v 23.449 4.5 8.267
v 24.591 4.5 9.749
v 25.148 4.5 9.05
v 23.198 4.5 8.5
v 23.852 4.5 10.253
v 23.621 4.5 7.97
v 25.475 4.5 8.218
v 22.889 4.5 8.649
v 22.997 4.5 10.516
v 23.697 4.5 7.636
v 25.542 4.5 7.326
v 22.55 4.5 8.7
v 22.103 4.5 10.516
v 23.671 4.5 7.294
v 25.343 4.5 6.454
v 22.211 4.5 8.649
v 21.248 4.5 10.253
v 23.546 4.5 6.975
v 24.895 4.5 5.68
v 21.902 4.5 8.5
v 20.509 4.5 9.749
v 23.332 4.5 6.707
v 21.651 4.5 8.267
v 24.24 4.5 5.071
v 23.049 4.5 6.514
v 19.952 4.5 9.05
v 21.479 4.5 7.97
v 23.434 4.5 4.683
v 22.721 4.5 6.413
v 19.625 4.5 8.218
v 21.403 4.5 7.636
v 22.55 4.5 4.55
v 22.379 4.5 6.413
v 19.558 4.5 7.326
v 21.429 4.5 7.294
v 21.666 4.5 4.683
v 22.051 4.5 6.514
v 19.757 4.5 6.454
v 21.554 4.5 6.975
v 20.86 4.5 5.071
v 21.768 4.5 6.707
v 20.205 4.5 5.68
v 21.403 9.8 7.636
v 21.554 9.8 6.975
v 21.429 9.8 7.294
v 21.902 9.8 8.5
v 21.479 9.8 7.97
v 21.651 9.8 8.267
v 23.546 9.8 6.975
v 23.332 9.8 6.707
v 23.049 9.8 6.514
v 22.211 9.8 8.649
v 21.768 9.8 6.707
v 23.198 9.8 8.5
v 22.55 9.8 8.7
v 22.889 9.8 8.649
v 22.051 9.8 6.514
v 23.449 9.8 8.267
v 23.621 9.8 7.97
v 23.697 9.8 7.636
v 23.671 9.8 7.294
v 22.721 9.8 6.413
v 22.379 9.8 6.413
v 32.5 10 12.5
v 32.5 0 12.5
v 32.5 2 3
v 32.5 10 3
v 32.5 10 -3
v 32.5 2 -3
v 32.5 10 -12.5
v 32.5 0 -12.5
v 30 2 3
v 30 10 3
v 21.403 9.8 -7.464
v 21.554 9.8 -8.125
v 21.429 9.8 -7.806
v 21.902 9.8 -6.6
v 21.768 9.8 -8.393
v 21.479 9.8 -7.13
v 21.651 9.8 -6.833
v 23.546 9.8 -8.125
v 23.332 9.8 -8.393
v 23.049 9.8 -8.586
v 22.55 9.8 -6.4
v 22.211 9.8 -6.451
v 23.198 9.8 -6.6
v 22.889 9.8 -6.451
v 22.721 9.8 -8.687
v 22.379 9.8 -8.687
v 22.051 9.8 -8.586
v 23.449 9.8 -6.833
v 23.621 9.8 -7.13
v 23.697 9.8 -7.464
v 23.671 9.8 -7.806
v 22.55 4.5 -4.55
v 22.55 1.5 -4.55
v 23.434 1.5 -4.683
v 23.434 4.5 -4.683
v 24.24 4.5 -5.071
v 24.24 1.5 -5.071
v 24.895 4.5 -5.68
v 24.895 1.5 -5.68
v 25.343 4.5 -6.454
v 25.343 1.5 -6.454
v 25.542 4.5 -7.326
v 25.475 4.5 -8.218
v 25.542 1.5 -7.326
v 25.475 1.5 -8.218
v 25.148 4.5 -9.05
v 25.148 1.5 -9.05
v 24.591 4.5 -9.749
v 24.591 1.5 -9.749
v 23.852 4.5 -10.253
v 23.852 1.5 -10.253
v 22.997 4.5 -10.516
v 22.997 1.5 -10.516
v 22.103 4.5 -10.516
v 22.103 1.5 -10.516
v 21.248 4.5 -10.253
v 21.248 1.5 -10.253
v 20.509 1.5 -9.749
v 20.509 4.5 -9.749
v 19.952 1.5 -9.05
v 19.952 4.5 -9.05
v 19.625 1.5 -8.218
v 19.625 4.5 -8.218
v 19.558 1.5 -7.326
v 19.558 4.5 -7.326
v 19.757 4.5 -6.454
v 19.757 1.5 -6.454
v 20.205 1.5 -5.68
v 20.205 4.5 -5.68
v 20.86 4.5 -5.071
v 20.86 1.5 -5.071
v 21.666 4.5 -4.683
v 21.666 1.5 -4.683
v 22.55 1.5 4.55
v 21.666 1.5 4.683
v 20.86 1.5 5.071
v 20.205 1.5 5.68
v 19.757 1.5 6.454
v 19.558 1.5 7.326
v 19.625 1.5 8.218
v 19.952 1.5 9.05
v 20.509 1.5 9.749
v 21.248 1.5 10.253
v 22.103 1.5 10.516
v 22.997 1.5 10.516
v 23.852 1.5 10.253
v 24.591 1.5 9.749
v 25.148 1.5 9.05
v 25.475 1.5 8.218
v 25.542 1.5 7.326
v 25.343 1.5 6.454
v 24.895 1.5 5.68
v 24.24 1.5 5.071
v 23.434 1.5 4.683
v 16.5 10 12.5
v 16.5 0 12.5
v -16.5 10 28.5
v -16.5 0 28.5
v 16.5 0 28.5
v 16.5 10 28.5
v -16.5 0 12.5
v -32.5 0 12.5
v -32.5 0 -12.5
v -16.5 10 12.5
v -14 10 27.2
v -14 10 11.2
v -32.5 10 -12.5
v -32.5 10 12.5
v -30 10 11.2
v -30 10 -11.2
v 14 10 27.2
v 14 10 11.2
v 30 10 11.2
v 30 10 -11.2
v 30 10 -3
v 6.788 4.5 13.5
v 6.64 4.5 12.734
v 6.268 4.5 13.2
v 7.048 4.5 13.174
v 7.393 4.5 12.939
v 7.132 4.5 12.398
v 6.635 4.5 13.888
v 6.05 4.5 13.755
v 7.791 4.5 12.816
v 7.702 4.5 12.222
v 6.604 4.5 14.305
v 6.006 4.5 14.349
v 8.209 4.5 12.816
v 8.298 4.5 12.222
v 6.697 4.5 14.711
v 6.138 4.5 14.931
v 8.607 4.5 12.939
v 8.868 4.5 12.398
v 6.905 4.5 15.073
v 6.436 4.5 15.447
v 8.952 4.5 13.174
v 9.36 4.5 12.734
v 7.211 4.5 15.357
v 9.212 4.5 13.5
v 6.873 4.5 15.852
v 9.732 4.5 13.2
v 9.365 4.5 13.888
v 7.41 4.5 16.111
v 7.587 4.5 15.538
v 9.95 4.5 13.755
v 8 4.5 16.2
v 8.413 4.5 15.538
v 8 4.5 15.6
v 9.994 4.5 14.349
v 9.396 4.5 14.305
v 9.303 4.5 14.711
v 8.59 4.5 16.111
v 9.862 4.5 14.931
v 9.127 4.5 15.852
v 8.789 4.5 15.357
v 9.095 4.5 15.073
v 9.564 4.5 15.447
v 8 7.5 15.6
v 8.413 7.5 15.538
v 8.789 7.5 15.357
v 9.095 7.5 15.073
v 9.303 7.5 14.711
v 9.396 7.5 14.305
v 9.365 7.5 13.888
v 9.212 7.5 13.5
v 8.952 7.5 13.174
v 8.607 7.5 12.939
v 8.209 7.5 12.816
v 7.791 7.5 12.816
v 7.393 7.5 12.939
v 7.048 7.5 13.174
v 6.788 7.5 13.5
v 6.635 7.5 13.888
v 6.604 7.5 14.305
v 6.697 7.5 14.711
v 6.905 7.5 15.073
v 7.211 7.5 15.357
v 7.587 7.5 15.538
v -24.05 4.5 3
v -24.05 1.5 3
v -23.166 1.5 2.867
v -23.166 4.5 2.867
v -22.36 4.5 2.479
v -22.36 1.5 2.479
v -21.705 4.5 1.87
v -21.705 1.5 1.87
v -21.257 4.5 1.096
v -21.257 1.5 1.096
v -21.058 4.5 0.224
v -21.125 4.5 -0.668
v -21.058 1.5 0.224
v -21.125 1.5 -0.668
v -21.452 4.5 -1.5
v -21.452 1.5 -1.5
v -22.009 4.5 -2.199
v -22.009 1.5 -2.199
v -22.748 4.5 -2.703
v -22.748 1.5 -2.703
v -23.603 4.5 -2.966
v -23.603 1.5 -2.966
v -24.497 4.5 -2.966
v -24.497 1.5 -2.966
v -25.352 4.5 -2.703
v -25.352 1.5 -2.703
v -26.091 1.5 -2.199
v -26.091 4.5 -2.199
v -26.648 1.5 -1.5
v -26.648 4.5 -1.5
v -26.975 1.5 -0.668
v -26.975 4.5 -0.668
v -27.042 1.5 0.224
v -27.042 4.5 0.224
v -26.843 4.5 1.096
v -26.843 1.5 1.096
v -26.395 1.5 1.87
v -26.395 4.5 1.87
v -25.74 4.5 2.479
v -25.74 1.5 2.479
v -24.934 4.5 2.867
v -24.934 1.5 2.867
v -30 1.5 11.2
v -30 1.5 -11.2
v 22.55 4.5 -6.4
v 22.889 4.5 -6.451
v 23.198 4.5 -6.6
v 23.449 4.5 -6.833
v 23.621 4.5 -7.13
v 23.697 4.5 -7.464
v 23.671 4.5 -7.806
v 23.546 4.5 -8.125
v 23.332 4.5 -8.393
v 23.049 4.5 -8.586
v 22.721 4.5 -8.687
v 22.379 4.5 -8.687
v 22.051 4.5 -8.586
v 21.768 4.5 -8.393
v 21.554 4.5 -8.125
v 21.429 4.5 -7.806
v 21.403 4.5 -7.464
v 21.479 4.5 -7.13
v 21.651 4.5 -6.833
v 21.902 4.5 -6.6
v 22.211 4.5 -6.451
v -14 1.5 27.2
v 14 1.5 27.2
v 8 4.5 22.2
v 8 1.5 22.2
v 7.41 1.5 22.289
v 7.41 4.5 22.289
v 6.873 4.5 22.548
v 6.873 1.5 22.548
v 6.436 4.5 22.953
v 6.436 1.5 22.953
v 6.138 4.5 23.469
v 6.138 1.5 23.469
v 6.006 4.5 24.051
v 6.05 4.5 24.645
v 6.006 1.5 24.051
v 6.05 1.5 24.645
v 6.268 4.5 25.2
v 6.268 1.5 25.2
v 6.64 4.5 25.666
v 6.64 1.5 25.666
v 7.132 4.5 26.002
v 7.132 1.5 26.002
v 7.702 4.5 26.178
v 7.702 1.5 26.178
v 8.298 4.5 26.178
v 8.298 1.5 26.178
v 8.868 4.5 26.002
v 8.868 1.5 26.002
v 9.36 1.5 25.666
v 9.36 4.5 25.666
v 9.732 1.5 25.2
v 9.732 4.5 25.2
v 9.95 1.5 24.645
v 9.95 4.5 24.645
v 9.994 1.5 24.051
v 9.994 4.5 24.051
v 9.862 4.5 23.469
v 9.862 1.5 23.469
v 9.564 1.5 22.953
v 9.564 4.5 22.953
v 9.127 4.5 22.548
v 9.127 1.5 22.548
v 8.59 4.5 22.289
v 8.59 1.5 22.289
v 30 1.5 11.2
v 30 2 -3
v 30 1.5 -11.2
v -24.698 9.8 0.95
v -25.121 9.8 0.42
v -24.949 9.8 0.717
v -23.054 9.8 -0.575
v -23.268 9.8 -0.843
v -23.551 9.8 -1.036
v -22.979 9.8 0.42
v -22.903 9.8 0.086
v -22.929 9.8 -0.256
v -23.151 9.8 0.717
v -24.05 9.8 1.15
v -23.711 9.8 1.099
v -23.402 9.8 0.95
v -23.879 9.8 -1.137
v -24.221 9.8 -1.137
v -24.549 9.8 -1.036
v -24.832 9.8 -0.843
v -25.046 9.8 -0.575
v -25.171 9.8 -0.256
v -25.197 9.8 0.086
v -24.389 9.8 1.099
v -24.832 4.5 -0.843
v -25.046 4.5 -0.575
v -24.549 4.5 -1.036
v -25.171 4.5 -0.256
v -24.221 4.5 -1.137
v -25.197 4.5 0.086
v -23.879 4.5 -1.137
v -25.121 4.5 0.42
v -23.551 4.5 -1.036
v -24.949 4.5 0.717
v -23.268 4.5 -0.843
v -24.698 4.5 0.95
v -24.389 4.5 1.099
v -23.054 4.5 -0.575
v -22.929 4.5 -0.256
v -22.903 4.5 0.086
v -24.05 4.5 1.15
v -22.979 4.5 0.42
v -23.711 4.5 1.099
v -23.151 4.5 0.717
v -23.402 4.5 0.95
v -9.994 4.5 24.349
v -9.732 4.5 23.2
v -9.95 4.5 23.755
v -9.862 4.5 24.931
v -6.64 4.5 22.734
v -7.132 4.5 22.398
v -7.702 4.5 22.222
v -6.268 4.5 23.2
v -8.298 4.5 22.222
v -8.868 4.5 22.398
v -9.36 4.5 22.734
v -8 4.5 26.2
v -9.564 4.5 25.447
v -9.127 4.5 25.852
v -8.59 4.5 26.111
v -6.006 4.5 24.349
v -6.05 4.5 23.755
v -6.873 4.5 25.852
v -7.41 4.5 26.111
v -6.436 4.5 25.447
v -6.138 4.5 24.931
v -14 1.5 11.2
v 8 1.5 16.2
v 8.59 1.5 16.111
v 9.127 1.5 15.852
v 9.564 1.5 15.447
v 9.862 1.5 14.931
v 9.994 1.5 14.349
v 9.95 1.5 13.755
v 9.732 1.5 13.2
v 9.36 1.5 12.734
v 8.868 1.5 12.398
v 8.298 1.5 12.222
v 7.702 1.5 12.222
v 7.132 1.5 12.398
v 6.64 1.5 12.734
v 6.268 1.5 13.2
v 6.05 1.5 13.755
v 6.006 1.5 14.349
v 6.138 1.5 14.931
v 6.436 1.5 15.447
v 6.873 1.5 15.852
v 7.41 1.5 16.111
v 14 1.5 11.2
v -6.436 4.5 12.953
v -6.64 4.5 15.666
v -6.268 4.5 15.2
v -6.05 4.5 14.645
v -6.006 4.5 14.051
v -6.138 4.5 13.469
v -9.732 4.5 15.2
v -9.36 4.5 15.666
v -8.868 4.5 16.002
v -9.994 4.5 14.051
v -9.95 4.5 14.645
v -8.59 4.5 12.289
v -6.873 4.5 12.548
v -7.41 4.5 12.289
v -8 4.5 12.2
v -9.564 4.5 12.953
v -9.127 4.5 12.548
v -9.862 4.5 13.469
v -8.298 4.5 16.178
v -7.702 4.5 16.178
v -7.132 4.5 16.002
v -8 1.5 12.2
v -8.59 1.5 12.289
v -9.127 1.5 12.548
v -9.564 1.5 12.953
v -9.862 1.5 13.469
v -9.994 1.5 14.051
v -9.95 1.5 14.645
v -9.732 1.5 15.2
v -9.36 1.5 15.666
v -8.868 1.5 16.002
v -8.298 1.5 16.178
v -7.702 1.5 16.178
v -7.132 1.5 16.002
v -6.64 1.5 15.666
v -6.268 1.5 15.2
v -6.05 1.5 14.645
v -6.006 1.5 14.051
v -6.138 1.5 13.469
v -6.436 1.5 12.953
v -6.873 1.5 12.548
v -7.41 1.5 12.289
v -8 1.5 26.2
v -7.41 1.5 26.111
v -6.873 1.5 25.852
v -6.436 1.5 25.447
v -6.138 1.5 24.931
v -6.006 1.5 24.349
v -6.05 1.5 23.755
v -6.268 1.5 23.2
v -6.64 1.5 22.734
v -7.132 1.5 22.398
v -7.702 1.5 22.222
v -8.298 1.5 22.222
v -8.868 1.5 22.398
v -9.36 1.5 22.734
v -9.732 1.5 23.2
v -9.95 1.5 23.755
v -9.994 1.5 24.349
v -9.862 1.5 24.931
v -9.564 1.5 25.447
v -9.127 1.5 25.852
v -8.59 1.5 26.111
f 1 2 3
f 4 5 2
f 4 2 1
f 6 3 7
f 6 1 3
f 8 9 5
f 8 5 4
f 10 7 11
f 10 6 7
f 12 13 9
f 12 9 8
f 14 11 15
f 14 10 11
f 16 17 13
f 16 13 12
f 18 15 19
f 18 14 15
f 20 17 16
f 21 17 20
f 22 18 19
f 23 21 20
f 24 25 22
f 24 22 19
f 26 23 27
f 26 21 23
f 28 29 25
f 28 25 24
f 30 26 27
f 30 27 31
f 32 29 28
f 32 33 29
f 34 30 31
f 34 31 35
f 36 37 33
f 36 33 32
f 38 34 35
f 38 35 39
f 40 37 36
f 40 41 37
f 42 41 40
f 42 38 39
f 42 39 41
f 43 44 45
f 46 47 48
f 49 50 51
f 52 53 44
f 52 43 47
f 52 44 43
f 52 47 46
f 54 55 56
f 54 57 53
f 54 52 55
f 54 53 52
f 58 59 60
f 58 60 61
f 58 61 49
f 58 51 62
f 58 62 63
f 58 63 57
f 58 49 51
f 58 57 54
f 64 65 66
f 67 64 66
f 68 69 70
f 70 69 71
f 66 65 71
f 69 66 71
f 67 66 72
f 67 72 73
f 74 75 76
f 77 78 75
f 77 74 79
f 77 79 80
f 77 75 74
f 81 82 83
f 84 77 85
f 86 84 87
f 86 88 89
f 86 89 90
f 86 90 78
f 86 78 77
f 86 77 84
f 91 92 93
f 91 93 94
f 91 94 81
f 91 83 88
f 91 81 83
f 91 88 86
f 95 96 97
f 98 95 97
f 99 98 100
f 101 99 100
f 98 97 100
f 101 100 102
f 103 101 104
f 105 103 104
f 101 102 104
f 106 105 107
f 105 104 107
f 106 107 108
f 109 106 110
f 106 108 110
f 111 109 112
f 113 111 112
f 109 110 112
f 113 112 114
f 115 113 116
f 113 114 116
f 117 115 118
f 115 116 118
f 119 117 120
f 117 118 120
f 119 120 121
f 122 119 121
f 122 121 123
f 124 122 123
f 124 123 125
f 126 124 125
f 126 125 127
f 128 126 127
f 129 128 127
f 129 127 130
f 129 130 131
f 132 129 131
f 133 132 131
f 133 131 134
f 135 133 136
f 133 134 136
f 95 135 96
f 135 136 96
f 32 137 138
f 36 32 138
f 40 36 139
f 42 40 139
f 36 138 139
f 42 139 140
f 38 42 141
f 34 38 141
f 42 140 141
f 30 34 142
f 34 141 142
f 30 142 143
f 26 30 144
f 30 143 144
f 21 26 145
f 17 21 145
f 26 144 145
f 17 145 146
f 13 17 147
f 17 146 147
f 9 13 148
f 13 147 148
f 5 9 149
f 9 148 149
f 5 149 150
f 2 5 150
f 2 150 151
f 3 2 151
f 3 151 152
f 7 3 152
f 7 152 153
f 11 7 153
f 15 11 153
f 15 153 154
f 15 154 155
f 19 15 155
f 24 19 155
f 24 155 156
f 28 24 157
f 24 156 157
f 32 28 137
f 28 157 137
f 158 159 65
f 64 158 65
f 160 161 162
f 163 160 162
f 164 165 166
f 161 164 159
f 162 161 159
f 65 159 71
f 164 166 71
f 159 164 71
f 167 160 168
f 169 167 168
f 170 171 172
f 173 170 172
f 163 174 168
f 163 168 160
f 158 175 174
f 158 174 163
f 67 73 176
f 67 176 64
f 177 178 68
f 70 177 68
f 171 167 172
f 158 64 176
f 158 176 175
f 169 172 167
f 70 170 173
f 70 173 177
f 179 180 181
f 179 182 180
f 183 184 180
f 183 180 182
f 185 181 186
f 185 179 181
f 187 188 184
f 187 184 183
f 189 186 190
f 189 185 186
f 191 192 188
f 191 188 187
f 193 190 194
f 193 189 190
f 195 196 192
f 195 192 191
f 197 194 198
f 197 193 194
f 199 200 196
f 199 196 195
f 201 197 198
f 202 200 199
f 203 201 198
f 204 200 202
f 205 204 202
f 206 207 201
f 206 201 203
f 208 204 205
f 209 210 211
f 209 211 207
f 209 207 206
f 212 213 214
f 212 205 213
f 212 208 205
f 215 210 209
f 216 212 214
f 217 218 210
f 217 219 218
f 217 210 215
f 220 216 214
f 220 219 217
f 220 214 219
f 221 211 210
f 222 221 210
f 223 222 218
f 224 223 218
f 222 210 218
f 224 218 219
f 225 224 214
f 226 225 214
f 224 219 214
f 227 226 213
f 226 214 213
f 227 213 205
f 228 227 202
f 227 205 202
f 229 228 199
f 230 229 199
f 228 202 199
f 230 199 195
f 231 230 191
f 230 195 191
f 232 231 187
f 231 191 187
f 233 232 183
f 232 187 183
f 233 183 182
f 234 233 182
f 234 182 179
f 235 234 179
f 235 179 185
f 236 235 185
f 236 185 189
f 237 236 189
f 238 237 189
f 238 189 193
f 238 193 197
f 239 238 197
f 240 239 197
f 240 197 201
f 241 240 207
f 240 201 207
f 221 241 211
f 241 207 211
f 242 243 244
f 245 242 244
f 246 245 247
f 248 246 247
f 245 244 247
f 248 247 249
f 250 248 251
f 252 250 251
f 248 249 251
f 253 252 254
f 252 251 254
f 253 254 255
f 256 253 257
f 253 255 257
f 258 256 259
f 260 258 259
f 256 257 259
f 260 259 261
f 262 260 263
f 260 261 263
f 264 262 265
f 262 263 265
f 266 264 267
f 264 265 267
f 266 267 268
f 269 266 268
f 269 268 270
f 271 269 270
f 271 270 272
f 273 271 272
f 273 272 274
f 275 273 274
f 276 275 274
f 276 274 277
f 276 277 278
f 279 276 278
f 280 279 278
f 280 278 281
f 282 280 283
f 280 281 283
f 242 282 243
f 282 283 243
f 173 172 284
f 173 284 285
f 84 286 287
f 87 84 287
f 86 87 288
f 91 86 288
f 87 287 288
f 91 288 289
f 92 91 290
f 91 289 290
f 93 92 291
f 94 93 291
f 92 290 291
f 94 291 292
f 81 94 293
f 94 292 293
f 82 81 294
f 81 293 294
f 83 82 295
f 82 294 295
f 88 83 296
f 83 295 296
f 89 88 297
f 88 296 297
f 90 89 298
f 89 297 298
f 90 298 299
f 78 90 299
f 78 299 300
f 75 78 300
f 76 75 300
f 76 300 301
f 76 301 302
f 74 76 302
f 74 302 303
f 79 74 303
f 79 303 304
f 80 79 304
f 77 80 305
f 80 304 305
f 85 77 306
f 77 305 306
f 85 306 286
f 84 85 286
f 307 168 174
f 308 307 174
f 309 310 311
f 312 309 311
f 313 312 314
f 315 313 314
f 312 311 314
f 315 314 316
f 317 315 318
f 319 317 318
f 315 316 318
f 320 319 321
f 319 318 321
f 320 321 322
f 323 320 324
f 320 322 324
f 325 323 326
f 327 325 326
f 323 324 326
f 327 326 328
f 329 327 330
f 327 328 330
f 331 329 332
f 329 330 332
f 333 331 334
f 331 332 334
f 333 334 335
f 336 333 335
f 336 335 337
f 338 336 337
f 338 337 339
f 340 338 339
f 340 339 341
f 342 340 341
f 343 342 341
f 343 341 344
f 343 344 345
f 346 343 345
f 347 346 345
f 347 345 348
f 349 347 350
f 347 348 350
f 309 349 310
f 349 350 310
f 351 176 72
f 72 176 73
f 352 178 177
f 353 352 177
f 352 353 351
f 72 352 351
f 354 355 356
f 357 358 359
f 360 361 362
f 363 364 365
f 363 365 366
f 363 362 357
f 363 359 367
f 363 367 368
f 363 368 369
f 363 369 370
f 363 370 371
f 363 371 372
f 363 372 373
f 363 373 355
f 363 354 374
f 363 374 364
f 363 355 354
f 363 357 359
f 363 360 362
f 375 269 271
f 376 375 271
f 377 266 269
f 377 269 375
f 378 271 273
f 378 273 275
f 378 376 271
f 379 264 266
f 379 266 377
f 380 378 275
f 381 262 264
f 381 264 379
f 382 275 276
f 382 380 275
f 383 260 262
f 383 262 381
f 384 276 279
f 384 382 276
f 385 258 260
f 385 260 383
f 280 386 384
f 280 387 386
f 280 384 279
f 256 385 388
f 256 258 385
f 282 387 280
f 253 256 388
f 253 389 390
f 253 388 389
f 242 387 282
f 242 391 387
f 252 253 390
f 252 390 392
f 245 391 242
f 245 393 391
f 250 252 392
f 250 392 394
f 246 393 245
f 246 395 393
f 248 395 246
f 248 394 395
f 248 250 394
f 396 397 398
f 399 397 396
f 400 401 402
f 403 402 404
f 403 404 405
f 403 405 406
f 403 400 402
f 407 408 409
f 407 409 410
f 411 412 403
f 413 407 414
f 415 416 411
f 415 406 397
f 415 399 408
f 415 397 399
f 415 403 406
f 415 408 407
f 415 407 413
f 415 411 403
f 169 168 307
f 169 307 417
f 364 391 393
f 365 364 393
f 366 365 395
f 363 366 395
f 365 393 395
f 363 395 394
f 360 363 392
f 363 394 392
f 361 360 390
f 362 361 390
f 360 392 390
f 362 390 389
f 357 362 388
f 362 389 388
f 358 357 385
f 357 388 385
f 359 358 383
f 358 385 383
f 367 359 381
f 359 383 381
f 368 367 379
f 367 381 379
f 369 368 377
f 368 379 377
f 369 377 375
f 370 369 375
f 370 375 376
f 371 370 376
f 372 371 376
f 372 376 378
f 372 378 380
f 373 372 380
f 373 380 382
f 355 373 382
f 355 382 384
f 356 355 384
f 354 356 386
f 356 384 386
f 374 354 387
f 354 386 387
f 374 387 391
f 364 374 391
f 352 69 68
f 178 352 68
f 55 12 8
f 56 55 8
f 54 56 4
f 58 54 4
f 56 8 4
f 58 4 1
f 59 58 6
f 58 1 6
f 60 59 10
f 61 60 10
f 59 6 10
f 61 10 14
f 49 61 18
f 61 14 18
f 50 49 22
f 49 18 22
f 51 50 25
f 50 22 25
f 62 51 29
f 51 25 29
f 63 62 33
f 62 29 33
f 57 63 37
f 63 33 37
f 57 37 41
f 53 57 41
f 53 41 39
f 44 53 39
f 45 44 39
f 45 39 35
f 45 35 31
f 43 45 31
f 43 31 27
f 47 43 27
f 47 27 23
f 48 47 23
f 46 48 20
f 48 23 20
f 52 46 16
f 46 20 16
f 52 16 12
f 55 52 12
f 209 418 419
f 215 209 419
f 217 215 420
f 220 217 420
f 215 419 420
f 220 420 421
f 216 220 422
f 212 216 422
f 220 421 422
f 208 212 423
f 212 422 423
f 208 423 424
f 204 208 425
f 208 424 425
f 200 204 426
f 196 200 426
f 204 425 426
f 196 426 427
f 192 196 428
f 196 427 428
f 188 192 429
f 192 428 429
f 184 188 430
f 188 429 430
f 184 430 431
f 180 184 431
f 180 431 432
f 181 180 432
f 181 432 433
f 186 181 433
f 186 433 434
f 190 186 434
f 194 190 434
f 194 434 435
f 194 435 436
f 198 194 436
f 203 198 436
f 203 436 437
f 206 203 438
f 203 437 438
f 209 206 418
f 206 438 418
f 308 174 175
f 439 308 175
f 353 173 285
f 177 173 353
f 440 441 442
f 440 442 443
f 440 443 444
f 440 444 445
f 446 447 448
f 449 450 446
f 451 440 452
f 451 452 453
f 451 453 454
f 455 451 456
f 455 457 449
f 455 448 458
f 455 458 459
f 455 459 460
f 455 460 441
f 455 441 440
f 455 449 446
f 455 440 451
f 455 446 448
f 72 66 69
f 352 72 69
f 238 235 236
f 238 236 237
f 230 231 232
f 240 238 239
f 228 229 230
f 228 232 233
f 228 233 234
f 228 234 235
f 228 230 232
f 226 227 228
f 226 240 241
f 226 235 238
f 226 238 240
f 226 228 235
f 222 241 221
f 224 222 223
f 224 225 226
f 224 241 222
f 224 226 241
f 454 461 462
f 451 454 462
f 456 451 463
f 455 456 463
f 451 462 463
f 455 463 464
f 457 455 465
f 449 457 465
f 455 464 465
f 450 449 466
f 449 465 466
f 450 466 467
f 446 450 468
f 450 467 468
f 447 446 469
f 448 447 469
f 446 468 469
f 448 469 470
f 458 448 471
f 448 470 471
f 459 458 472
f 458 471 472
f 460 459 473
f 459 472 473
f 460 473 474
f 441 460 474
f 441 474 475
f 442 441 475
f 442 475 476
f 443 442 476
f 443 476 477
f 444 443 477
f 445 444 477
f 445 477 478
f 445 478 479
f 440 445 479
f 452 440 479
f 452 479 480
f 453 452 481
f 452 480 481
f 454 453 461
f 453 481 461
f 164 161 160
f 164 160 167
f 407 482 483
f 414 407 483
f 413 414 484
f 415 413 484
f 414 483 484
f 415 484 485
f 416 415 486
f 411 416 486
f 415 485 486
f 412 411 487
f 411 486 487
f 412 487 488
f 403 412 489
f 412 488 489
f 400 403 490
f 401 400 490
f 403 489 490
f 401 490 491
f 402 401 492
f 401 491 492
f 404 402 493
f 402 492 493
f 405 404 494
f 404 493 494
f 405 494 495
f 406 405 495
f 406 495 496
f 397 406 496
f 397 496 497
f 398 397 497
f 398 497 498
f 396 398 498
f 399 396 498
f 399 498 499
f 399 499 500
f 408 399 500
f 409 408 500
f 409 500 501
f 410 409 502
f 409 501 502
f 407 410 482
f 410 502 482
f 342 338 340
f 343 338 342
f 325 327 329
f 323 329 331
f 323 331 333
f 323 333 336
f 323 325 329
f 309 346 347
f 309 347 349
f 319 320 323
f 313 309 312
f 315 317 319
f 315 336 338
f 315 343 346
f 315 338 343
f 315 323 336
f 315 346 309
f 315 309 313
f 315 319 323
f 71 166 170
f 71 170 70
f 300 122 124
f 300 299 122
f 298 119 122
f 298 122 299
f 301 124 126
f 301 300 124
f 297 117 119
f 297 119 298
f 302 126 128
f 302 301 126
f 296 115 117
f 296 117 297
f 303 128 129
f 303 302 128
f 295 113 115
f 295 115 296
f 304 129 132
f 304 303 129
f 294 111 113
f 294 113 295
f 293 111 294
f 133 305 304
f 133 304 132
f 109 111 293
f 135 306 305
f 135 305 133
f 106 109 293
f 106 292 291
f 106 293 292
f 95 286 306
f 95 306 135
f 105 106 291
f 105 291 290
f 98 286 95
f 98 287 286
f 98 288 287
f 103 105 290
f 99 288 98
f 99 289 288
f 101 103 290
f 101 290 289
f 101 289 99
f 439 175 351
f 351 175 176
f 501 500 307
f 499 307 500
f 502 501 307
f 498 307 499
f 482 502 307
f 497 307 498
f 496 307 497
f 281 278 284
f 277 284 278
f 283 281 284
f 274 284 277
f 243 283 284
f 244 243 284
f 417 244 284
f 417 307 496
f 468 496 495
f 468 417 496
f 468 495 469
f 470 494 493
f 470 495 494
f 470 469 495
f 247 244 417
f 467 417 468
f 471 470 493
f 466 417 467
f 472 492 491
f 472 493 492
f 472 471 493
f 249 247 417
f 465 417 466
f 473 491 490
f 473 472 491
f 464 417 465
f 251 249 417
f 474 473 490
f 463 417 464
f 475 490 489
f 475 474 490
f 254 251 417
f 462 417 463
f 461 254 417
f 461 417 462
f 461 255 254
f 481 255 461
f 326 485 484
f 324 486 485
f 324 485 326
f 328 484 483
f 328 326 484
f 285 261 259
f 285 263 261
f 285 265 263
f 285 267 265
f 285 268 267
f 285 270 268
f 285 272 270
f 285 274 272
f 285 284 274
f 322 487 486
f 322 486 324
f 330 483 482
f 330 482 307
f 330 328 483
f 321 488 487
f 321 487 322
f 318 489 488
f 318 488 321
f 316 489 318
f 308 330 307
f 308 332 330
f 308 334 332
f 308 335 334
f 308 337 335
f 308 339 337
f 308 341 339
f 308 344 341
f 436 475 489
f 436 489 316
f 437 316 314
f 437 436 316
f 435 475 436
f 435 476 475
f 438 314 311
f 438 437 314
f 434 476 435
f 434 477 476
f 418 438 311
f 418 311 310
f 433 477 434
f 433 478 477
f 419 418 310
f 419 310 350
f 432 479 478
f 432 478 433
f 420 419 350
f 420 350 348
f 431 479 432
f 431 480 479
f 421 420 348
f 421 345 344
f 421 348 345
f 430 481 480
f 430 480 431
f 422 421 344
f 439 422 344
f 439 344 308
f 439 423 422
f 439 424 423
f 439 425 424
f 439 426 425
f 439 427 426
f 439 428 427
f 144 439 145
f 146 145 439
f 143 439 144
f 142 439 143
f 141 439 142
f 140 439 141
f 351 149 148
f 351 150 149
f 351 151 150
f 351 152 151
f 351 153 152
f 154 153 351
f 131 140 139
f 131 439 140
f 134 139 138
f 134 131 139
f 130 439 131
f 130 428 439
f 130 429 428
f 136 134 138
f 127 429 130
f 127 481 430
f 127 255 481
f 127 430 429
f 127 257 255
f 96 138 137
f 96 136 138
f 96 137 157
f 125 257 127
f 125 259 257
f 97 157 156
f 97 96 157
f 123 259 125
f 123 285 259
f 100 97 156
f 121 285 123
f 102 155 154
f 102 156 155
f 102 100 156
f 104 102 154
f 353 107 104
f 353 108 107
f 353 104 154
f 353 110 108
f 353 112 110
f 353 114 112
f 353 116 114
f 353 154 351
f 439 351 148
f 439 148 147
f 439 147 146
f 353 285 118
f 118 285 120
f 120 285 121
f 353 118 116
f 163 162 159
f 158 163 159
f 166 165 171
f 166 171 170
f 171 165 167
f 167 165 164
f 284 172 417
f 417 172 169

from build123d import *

# Parameters (mm, degrees)
CROQUIS1_W              = 65
CROQUIS1_H              = 25
SALIENTE_EXTRUIR1_DEPTH = 10
CROQUIS2_W              = 60
CROQUIS2_H              = 22.4
CORTAR_EXTRUIR1_DEPTH   = 8.5
SKETCH3_R               = 3
BOSS_EXTRUDE3_DEPTH     = 3
SKETCH4_R               = 1.15
BOSS_EXTRUDE4_DEPTH     = 5.3
CORTAR_EXTRUIR3_REACH   = 68.942
CROQUIS5_W              = 6
CROQUIS5_H              = 8
CROQUIS12_W             = 33
CROQUIS12_H             = 16
SALIENTE_EXTRUIR7_DEPTH = 10
CROQUIS13_W             = 28
CROQUIS13_H             = 16
CORTAR_EXTRUIR6_DEPTH   = 8.5
CROQUIS14_R             = 2
SALIENTE_EXTRUIR8_DEPTH = 3
CROQUIS15_R             = 1.4
SALIENTE_EXTRUIR9_DEPTH = 3


with BuildPart() as part:
    # Croquis1 → Saliente-Extruir1 (new body)
    with BuildSketch(Plane(origin=(0, 0, 0), x_dir=(1, 0, 0), z_dir=(0, 1, 0))):
        Rectangle(CROQUIS1_W, CROQUIS1_H)
    extrude(amount=SALIENTE_EXTRUIR1_DEPTH)

    # Croquis2 → Cortar-Extruir1 (cut)
    with BuildSketch(Plane(origin=(0, 10, 0), x_dir=(1, 0, 0), z_dir=(0, 1, 0))):
        Rectangle(CROQUIS2_W, CROQUIS2_H)
    extrude(amount=-CORTAR_EXTRUIR1_DEPTH, mode=Mode.SUBTRACT)

    # Sketch3 → Boss-Extrude3 (add)
    with BuildSketch(Plane(origin=(0, 1.5, 0), x_dir=(1, 0, 0), z_dir=(0, 1, 0))):
        with Locations(Location((-24.05, 0, 0), (0, 0, 270))):
            Circle(SKETCH3_R)
        with Locations(Location((22.55, 7.55, 0), (0, 0, 270))):
            Circle(SKETCH3_R)
        with Locations(Location((22.55, -7.55, 0), (0, 0, 90))):
            Circle(SKETCH3_R)
    extrude(amount=BOSS_EXTRUDE3_DEPTH)

    # Sketch4 → Boss-Extrude4 (add)
    with BuildSketch(Plane(origin=(0, 4.5, 0), x_dir=(1, 0, 0), z_dir=(0, 1, 0))):
        with Locations(Location((-24.05, 0, 0), (0, 0, 270))):
            Circle(SKETCH4_R)
        with Locations(Location((22.55, 7.55, 0), (0, 0, 270))):
            Circle(SKETCH4_R)
        with Locations(Location((22.55, -7.55, 0), (0, 0, 270))):
            Circle(SKETCH4_R)
    extrude(amount=BOSS_EXTRUDE4_DEPTH)

    # Croquis5 → Cortar-Extruir3 (cut, up to next)
    with BuildSketch(Plane(origin=(32.5, 0, 0), x_dir=(0, 0, -1), z_dir=(1, 0, 0)), mode=Mode.PRIVATE) as cortar_extruir3_sk1:
        with Locations((0, 6)):
            Rectangle(CROQUIS5_W, CROQUIS5_H)
    cortar_extruir3_tool1 = extrude(cortar_extruir3_sk1.sketch, amount=-CORTAR_EXTRUIR3_REACH, mode=Mode.PRIVATE) & part.part
    add(cortar_extruir3_tool1.solids().sort_by_distance((32.5, 6, 0))[0], mode=Mode.SUBTRACT)

    # Croquis12 → Saliente-Extruir7 (add)
    with BuildSketch(Plane(origin=(0, 0, 0), x_dir=(1, 0, 0), z_dir=(0, 1, 0))):
        with Locations((0, -20.5)):
            Rectangle(CROQUIS12_W, CROQUIS12_H)
    extrude(amount=SALIENTE_EXTRUIR7_DEPTH)

    # Croquis13 → Cortar-Extruir6 (cut)
    with BuildSketch(Plane(origin=(0, 10, 0), x_dir=(1, 0, 0), z_dir=(0, 1, 0))):
        with Locations((0, -19.2)):
            Rectangle(CROQUIS13_W, CROQUIS13_H)
    extrude(amount=-CORTAR_EXTRUIR6_DEPTH, mode=Mode.SUBTRACT)

    # Croquis14 → Saliente-Extruir8 (add)
    with BuildSketch(Plane(origin=(0, 1.5, 0), x_dir=(1, 0, 0), z_dir=(0, 1, 0))):
        with Locations(Location((8, -14.2, 0), (0, 0, 270))):
            Circle(CROQUIS14_R)
        with Locations(Location((8, -24.2, 0), (0, 0, 90))):
            Circle(CROQUIS14_R)
        with Locations(Location((-8, -24.2, 0), (0, 0, 270))):
            Circle(CROQUIS14_R)
        with Locations(Location((-8, -14.2, 0), (0, 0, 90))):
            Circle(CROQUIS14_R)
    extrude(amount=SALIENTE_EXTRUIR8_DEPTH)

    # Croquis15 → Saliente-Extruir9 (add)
    with BuildSketch(Plane(origin=(0, 4.5, 0), x_dir=(1, 0, 0), z_dir=(0, 1, 0))):
        with Locations(Location((8, -14.2, 0), (0, 0, 270))):
            Circle(CROQUIS15_R)
    extrude(amount=SALIENTE_EXTRUIR9_DEPTH)


solid = part.part
